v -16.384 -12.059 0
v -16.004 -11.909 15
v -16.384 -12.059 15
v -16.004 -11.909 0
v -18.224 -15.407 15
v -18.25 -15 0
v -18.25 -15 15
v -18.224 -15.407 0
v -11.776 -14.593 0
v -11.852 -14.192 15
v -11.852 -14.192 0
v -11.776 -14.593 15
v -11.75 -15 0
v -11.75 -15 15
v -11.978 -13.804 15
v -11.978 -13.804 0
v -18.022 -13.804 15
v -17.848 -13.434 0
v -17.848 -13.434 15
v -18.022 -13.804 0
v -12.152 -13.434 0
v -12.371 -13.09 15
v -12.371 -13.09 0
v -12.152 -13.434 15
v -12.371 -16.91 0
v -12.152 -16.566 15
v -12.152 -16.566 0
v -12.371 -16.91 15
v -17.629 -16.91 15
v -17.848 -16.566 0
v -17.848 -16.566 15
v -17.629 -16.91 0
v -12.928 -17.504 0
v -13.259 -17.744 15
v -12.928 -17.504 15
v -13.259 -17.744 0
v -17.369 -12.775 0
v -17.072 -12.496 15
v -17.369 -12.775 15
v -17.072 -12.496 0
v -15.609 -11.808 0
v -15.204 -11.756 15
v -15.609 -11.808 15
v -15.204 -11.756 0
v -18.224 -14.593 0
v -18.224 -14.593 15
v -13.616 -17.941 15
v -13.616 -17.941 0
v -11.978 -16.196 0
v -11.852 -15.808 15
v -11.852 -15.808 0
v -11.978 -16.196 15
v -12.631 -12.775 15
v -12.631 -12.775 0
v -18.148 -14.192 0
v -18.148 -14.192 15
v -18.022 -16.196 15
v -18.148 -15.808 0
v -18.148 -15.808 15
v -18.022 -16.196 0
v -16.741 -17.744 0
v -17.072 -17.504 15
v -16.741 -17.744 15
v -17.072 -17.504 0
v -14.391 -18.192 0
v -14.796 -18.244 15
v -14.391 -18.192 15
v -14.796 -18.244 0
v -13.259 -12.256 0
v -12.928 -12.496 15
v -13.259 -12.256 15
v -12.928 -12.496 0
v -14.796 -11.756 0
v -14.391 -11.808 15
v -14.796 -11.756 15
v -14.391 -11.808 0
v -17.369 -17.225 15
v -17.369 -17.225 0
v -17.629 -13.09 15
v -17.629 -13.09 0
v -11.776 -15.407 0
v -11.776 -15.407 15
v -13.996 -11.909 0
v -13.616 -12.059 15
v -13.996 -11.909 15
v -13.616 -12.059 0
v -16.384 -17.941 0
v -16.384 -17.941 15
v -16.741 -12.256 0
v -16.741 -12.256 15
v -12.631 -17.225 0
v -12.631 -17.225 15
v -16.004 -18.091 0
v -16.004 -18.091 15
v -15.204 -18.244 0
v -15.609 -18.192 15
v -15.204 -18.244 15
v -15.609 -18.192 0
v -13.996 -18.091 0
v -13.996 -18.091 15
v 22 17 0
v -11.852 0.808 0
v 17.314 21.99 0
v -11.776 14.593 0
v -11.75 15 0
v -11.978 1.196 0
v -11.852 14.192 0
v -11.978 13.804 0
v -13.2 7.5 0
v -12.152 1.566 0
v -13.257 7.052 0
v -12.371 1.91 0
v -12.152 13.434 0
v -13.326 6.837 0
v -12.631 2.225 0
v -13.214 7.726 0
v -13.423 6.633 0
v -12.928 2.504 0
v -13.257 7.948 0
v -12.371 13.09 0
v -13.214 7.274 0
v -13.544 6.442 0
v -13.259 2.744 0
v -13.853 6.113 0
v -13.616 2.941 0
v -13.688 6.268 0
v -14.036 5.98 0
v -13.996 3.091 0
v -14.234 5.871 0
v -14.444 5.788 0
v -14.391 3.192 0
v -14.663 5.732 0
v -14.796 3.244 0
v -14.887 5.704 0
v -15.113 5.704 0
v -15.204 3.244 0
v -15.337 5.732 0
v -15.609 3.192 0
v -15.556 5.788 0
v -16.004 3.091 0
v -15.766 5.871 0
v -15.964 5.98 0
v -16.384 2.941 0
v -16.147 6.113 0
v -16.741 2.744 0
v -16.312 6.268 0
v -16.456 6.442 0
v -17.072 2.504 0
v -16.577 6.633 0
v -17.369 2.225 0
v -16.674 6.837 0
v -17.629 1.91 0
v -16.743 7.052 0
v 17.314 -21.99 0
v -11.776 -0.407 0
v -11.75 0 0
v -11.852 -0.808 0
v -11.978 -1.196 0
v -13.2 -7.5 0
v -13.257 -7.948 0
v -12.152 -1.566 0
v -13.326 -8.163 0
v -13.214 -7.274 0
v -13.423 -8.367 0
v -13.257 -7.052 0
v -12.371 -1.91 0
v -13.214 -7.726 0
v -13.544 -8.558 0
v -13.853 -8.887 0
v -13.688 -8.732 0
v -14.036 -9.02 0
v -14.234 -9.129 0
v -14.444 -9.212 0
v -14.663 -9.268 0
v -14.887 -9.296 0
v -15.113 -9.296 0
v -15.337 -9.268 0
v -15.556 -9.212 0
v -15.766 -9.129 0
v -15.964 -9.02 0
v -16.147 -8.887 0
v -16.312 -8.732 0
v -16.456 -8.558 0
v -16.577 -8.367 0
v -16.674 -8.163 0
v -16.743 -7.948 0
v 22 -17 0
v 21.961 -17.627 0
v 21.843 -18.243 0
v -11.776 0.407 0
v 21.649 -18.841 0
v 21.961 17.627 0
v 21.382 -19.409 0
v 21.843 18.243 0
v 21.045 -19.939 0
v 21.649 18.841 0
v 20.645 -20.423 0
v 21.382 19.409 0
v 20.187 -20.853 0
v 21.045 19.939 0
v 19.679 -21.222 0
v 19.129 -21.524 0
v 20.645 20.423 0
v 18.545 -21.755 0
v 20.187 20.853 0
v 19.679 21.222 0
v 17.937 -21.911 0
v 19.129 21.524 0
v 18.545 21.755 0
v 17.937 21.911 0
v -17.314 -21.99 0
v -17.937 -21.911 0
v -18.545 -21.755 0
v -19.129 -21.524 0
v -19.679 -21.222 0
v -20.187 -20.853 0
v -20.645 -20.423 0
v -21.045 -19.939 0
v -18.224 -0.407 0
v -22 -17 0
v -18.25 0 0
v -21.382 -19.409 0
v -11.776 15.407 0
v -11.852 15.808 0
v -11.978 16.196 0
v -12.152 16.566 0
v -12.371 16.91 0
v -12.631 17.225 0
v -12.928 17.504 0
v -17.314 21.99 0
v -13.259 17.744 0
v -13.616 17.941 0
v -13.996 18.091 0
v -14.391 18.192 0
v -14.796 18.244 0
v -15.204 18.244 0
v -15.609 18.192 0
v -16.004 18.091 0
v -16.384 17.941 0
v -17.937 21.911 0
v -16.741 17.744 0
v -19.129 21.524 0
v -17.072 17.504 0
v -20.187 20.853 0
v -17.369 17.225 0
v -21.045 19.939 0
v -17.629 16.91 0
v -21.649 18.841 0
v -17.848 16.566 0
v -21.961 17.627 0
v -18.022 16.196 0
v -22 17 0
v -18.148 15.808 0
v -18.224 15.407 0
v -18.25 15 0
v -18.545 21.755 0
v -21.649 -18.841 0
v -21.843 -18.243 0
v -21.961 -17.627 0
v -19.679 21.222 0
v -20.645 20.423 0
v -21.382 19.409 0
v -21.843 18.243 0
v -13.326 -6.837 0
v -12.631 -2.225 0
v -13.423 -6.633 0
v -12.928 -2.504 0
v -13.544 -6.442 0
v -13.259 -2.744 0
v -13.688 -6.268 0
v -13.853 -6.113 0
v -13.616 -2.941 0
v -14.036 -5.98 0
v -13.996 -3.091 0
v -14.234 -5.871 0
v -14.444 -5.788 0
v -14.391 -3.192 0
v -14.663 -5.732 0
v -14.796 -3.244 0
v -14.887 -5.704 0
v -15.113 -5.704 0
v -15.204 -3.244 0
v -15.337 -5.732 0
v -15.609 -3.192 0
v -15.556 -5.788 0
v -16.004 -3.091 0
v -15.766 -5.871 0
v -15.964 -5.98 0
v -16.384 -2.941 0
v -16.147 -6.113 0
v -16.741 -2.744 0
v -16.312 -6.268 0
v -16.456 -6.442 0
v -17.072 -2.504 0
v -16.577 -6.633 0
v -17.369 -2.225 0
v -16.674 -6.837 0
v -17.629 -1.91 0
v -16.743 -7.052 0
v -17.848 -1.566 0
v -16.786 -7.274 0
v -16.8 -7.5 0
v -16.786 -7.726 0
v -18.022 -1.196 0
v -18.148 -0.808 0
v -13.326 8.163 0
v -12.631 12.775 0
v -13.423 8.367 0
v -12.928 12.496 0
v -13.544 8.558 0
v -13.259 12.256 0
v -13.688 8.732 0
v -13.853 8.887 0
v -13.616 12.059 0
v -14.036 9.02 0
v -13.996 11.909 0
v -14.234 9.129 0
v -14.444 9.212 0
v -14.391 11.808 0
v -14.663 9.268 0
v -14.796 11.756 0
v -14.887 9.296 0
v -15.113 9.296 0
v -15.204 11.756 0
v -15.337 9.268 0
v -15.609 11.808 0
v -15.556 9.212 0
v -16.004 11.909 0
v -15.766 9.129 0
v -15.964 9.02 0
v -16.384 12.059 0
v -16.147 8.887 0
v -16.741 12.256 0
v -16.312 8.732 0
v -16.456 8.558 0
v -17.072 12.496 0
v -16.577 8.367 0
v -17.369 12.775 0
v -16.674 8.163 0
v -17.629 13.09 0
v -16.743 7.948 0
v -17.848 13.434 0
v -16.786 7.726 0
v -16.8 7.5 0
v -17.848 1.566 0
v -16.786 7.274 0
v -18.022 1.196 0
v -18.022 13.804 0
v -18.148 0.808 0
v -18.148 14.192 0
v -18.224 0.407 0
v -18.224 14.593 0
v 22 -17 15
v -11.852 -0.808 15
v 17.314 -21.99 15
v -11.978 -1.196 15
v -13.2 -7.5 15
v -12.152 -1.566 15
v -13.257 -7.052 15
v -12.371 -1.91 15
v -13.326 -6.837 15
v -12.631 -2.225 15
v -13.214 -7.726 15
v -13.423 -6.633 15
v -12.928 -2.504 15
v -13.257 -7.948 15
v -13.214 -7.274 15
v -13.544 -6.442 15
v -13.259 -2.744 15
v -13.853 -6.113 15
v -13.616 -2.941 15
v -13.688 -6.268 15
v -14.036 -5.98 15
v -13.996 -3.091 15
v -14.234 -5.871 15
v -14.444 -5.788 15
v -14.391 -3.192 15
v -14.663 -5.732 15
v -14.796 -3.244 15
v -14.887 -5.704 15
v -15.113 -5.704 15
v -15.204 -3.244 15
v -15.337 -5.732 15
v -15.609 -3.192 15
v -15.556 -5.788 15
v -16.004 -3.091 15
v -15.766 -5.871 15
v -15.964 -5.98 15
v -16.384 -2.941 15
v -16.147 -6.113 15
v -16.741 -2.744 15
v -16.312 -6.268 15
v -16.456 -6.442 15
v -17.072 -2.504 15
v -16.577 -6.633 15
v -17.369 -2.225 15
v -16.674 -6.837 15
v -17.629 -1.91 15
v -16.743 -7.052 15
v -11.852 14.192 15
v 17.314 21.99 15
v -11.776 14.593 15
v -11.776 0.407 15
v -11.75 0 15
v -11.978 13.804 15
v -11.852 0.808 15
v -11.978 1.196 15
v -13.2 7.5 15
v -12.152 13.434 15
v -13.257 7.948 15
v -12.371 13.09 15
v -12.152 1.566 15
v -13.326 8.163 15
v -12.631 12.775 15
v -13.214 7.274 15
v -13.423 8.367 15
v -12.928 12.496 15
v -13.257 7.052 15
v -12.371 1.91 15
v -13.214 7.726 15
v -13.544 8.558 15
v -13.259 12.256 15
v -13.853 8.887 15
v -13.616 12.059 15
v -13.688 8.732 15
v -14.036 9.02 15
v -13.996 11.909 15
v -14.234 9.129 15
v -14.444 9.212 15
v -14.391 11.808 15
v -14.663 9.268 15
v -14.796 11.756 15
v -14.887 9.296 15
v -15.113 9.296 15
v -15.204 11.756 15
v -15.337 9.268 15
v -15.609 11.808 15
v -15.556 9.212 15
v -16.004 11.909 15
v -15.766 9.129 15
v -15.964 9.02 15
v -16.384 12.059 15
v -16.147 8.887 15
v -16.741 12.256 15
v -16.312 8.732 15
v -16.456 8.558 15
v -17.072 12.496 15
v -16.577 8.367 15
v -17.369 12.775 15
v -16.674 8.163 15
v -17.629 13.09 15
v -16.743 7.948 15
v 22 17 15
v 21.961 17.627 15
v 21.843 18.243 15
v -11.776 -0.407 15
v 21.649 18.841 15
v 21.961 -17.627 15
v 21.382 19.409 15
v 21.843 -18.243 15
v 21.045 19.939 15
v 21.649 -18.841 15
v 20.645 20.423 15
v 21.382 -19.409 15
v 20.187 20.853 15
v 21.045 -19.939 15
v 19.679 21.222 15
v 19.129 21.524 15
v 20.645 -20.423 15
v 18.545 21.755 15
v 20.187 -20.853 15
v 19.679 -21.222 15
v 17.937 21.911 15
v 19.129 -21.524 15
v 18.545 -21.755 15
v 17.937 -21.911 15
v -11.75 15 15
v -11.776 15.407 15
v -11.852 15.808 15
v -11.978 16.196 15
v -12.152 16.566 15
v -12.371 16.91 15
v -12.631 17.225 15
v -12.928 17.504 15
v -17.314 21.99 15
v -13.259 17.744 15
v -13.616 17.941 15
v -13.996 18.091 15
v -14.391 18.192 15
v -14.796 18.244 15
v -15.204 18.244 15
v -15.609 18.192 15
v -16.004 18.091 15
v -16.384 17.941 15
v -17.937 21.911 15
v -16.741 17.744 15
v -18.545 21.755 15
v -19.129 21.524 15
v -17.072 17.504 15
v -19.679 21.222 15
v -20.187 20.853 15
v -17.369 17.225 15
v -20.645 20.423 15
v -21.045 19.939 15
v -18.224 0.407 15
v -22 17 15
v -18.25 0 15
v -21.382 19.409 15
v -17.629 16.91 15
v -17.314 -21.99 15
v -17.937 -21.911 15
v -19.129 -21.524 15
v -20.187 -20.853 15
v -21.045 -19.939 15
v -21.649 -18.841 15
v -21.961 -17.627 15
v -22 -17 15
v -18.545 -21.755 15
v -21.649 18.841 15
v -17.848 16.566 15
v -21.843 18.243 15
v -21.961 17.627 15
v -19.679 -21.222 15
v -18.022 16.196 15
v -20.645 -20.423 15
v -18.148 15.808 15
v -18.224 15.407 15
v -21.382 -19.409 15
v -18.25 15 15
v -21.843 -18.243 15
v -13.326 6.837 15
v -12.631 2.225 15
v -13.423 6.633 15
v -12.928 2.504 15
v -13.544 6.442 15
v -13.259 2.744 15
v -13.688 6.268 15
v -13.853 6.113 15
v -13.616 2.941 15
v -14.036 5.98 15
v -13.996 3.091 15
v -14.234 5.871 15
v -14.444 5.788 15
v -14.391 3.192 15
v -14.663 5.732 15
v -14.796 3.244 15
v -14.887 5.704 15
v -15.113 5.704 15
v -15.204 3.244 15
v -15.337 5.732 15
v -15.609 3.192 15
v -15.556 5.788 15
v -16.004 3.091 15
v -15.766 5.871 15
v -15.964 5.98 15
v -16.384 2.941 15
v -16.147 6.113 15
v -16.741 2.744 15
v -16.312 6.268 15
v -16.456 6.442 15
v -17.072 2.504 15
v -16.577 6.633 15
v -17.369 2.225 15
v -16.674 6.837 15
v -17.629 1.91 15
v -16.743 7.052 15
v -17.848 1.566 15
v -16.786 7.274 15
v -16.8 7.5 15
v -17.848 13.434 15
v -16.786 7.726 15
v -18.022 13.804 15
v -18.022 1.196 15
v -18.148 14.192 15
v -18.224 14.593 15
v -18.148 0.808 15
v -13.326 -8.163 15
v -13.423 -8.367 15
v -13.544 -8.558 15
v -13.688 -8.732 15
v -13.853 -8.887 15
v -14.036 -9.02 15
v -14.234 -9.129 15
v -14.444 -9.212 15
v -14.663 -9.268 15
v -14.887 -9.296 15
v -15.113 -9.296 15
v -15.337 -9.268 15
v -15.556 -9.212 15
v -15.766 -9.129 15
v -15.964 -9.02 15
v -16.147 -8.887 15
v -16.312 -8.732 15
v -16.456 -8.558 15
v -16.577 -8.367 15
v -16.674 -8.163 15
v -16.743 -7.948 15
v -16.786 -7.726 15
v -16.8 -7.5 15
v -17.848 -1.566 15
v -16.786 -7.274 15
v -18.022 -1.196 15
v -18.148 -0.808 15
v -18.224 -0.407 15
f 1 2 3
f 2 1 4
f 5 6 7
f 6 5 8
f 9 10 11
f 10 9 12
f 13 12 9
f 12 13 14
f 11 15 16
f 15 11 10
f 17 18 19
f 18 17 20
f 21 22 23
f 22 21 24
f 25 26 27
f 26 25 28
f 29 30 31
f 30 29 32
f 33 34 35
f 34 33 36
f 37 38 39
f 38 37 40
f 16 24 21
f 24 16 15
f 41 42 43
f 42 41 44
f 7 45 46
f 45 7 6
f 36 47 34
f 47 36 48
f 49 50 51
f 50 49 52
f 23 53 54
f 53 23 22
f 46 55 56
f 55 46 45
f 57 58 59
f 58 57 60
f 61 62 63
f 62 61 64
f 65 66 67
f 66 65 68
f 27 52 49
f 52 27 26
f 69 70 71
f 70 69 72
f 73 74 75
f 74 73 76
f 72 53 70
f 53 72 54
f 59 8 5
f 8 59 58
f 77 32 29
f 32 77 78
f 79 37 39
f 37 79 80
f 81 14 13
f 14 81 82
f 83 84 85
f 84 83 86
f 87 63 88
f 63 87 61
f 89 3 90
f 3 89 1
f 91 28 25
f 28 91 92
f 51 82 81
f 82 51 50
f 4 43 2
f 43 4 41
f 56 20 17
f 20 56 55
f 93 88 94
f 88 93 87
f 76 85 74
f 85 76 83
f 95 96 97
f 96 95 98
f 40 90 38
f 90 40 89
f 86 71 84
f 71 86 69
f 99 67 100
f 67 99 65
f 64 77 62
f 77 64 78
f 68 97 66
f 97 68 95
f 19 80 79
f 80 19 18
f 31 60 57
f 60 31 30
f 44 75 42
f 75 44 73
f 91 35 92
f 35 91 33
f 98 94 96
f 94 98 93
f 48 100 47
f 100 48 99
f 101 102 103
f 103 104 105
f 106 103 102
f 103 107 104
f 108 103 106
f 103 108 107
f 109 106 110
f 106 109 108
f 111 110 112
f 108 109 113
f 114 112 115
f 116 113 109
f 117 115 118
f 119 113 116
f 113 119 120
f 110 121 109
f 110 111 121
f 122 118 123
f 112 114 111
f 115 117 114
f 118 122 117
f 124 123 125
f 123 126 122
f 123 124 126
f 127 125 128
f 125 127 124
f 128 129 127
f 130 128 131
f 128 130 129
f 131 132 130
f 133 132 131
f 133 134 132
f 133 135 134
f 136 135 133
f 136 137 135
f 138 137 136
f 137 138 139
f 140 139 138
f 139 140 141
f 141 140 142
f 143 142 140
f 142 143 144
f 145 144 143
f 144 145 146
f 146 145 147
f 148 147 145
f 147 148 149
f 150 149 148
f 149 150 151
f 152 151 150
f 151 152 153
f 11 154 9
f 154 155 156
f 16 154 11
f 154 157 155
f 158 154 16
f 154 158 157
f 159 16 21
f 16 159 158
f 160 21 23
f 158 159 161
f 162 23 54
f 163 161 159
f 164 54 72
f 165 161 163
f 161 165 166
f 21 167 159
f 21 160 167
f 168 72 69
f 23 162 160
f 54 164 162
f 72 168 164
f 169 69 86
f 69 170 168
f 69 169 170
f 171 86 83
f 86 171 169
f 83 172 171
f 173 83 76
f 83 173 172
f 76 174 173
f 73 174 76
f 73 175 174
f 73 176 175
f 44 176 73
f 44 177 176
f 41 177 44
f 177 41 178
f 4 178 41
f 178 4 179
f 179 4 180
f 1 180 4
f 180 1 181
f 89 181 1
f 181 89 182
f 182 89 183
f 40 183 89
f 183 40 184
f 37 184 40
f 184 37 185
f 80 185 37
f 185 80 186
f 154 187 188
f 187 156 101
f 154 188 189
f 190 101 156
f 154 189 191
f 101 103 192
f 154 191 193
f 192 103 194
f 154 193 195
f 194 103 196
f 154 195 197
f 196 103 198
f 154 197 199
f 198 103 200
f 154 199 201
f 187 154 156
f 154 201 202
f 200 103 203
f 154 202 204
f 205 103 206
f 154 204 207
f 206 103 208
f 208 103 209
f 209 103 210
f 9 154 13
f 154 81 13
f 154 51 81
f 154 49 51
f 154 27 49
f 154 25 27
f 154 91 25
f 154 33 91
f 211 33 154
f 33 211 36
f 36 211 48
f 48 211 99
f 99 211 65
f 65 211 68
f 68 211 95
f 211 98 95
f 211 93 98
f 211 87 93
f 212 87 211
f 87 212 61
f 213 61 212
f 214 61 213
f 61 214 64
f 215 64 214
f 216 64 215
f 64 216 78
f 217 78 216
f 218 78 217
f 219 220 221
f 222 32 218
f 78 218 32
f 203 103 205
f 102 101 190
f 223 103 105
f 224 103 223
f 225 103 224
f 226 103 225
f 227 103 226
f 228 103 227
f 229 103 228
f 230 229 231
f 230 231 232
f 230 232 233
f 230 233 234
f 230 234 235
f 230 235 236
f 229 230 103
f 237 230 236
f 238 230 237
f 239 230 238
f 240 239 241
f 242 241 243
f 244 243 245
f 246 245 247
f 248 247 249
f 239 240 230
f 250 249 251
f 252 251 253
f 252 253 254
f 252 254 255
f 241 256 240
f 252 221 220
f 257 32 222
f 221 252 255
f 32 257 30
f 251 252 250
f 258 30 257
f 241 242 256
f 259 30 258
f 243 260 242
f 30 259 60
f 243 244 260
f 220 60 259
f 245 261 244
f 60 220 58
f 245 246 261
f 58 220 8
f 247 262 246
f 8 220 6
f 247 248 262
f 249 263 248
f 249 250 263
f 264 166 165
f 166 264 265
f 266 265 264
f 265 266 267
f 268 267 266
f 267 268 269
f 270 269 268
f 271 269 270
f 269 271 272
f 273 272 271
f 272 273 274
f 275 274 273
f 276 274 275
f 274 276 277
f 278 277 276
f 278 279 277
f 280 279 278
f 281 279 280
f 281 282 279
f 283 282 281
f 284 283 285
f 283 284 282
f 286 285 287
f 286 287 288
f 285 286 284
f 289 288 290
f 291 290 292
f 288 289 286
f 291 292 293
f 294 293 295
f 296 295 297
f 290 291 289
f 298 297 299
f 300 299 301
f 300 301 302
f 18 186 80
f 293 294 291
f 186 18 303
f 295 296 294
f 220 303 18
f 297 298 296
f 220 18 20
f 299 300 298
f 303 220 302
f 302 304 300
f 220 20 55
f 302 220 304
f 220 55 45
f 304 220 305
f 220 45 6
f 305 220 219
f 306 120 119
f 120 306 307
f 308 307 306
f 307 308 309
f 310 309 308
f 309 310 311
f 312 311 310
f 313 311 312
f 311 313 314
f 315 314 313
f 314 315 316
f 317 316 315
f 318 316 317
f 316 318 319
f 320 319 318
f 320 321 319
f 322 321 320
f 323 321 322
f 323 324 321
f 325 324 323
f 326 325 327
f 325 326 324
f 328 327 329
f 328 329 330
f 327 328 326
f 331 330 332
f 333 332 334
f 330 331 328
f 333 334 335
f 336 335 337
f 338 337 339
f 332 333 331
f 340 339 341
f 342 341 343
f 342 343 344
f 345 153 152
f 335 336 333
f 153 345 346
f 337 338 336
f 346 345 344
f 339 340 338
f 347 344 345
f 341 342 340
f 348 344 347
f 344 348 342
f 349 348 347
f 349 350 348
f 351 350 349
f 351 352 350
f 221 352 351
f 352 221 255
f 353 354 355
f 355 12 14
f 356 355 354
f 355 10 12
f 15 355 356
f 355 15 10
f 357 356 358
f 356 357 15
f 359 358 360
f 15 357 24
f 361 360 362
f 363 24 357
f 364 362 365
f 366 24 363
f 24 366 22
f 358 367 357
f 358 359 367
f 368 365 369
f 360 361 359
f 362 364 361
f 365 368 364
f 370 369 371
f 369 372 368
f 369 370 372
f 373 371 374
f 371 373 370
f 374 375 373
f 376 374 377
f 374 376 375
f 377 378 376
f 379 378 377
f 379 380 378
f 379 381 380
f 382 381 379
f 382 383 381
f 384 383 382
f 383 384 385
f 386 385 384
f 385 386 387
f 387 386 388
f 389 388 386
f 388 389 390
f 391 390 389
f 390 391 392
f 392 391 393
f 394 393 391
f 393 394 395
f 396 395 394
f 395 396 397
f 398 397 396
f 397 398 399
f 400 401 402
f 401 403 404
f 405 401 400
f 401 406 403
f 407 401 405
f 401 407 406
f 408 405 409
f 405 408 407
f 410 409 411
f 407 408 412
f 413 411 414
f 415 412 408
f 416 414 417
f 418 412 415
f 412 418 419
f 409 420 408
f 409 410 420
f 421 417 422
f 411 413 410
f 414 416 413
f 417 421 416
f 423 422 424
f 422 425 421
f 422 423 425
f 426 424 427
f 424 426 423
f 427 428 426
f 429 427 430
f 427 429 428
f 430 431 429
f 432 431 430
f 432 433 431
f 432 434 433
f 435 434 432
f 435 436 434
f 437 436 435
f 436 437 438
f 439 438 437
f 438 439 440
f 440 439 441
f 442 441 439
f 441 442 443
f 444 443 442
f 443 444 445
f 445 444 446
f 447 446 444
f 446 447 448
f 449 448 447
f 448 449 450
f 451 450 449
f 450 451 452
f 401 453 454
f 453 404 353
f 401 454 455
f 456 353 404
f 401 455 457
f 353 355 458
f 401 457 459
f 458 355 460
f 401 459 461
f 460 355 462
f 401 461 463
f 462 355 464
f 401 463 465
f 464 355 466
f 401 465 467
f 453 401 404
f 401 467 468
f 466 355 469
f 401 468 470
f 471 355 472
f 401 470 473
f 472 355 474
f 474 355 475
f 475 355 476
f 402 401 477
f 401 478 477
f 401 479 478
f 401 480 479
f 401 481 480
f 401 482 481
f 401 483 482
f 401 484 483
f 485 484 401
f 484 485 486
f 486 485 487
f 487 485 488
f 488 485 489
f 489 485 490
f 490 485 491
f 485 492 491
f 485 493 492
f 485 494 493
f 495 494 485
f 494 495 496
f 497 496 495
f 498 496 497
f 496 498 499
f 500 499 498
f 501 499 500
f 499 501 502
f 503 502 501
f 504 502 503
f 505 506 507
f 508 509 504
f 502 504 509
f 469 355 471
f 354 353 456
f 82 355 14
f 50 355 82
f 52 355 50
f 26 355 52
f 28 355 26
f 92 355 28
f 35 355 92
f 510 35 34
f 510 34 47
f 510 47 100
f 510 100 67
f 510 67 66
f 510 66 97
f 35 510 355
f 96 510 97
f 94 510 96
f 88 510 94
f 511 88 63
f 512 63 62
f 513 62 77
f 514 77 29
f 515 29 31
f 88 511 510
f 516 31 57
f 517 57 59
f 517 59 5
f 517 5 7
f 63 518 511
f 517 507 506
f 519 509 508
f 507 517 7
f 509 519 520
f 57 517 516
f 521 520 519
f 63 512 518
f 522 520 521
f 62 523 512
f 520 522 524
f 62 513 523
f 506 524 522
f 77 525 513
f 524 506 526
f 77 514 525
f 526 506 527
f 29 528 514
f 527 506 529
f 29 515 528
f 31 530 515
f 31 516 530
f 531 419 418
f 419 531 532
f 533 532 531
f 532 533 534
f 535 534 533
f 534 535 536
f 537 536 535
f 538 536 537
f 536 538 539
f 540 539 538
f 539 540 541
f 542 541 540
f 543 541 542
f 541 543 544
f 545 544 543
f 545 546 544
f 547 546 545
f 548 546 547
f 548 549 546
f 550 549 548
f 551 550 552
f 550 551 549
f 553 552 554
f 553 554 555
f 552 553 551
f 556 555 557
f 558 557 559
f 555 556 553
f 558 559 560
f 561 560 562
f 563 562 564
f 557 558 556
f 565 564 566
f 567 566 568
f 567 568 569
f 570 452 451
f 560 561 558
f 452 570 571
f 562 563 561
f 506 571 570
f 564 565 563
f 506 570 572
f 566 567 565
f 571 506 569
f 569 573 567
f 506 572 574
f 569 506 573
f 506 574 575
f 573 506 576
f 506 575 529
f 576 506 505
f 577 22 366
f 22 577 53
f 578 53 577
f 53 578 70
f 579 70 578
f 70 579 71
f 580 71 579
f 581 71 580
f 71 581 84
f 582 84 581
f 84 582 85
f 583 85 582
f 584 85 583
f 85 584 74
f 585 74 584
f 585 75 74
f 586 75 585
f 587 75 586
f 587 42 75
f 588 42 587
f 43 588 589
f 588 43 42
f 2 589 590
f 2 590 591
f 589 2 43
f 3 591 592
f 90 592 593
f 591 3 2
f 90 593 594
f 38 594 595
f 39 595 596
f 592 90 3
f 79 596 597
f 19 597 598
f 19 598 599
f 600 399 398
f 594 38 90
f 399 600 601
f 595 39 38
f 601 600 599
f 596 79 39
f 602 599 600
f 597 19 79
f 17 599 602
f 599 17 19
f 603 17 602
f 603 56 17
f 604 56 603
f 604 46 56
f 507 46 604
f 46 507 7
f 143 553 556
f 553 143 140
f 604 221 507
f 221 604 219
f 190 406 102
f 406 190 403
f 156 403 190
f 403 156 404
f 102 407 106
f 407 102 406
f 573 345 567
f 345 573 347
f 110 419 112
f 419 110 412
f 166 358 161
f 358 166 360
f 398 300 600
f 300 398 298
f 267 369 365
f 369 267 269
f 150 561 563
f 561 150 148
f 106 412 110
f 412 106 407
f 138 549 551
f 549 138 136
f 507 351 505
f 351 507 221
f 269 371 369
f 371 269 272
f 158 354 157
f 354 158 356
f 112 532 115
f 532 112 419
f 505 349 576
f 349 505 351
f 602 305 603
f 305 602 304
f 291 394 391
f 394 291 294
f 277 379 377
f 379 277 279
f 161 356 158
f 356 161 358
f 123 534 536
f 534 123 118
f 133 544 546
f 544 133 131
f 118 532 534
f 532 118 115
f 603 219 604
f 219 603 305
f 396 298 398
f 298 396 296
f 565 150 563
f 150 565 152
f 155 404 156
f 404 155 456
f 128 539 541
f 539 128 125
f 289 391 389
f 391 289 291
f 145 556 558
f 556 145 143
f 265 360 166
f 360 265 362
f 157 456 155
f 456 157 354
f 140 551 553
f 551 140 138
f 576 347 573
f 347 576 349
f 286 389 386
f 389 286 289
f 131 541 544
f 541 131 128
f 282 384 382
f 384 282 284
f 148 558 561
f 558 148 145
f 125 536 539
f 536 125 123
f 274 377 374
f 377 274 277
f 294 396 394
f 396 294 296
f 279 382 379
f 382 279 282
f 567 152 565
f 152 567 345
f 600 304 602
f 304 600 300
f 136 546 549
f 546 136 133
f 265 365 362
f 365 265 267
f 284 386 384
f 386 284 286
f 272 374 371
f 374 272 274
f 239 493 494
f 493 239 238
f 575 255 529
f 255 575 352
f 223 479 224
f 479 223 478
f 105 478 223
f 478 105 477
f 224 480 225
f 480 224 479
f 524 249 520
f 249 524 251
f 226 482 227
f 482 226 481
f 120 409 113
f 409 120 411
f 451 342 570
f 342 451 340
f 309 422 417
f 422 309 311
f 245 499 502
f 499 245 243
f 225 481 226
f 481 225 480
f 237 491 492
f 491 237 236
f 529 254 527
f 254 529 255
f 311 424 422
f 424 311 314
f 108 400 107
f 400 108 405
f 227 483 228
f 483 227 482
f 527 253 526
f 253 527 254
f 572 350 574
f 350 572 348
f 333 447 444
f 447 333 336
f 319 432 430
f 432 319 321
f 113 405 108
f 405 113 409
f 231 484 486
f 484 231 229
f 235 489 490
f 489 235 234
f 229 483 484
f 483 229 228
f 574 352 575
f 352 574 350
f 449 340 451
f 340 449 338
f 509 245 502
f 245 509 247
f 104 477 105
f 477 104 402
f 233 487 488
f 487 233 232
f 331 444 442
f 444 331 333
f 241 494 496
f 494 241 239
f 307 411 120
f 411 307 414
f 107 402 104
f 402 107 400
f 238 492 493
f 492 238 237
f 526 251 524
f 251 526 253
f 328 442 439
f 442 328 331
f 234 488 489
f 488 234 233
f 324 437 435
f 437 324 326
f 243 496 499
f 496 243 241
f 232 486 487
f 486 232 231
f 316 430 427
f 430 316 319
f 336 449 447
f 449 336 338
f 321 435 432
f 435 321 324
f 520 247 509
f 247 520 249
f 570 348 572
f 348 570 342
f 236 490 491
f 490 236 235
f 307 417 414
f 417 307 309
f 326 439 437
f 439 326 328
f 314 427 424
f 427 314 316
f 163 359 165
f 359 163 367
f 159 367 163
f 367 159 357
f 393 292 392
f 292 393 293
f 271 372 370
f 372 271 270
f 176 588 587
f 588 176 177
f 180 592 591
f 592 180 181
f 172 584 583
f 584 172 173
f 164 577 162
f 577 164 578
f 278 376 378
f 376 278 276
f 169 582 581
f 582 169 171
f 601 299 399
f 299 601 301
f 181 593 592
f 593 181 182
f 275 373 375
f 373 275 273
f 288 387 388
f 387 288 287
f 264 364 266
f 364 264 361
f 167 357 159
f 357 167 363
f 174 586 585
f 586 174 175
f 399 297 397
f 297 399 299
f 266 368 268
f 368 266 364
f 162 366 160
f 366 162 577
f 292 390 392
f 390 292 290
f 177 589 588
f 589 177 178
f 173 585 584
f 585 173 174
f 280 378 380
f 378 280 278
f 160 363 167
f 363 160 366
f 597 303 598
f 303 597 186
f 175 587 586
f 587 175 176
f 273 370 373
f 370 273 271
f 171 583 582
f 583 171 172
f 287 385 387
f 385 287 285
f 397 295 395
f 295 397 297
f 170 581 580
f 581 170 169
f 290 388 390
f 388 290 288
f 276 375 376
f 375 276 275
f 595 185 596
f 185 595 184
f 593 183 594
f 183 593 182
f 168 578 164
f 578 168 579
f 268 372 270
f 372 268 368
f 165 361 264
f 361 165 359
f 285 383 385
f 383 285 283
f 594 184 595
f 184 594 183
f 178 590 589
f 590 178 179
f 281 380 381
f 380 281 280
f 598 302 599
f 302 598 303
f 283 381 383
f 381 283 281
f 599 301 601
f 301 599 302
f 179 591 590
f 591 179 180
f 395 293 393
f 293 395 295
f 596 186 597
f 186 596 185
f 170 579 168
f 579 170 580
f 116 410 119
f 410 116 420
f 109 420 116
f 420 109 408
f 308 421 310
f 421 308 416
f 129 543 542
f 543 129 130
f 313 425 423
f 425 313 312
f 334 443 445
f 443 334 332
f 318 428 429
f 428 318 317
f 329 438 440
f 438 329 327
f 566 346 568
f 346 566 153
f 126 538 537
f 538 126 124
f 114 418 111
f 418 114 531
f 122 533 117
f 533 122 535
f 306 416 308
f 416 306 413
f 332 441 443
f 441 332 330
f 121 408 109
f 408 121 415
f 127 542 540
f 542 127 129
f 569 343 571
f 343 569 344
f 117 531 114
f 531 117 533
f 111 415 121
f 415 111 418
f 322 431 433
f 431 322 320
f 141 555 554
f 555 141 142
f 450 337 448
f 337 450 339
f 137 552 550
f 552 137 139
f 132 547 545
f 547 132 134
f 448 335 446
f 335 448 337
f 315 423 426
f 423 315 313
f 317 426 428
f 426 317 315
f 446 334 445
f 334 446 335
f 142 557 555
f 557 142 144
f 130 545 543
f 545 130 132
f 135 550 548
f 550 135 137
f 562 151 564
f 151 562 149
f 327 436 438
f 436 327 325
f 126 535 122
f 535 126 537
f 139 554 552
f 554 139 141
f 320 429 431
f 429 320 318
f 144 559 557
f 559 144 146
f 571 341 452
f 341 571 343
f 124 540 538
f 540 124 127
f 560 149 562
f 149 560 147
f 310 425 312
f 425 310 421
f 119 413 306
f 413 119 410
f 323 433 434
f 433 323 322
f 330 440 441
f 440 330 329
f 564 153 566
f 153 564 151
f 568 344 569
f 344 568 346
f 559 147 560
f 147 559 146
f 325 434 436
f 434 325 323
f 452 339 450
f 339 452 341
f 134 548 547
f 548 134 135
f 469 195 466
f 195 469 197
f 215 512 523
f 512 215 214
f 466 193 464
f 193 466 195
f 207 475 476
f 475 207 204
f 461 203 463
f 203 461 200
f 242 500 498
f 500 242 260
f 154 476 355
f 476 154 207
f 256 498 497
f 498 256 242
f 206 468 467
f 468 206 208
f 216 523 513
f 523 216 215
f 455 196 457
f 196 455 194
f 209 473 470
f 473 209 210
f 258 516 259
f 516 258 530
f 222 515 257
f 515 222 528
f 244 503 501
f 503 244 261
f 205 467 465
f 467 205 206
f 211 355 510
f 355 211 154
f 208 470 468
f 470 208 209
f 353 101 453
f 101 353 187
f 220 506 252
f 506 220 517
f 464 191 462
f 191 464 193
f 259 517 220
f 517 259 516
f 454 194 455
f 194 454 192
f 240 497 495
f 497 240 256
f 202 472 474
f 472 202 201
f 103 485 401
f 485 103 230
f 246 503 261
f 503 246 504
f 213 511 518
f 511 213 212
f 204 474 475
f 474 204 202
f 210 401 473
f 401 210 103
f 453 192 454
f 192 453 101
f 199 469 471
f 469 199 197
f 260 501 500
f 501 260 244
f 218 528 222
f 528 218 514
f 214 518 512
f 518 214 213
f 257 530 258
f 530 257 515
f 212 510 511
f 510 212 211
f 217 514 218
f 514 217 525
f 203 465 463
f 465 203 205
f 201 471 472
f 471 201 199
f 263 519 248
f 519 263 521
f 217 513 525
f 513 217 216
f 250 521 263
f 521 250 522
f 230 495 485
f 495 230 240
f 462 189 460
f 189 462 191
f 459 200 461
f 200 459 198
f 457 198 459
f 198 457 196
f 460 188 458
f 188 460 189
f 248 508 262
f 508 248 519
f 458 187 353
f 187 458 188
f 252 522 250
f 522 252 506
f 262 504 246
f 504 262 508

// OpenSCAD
$fn = 50;


difference() {
	union() {
		hull() {
			translate(v = [-17.0000000000, 17.0000000000, 0]) {
				cylinder(h = 15, r = 5);
			}
			translate(v = [17.0000000000, 17.0000000000, 0]) {
				cylinder(h = 15, r = 5);
			}
			translate(v = [-17.0000000000, -17.0000000000, 0]) {
				cylinder(h = 15, r = 5);
			}
			translate(v = [17.0000000000, -17.0000000000, 0]) {
				cylinder(h = 15, r = 5);
			}
		}
	}
	union() {
		translate(v = [-15.0000000000, -15.0000000000, 0]) {
			cylinder(h = 15, r = 3.2500000000);
		}
		translate(v = [-15.0000000000, 0.0000000000, 0]) {
			cylinder(h = 15, r = 3.2500000000);
		}
		translate(v = [-15.0000000000, 15.0000000000, 0]) {
			cylinder(h = 15, r = 3.2500000000);
		}
		translate(v = [-15.0000000000, -15.0000000000, 0]) {
			cylinder(h = 15, r = 1.8000000000);
		}
		translate(v = [-15.0000000000, -7.5000000000, 0]) {
			cylinder(h = 15, r = 1.8000000000);
		}
		translate(v = [-15.0000000000, 0.0000000000, 0]) {
			cylinder(h = 15, r = 1.8000000000);
		}
		translate(v = [-15.0000000000, 7.5000000000, 0]) {
			cylinder(h = 15, r = 1.8000000000);
		}
		translate(v = [-15.0000000000, 15.0000000000, 0]) {
			cylinder(h = 15, r = 1.8000000000);
		}
		translate(v = [-15.0000000000, -15.0000000000, 0]) {
			cylinder(h = 15, r = 1.8000000000);
		}
		translate(v = [-15.0000000000, -7.5000000000, 0]) {
			cylinder(h = 15, r = 1.8000000000);
		}
		translate(v = [-15.0000000000, 0.0000000000, 0]) {
			cylinder(h = 15, r = 1.8000000000);
		}
		translate(v = [-15.0000000000, 7.5000000000, 0]) {
			cylinder(h = 15, r = 1.8000000000);
		}
		translate(v = [-15.0000000000, 15.0000000000, 0]) {
			cylinder(h = 15, r = 1.8000000000);
		}
		translate(v = [-15.0000000000, -15.0000000000, 0]) {
			cylinder(h = 15, r = 1.8000000000);
		}
		translate(v = [-15.0000000000, -7.5000000000, 0]) {
			cylinder(h = 15, r = 1.8000000000);
		}
		translate(v = [-15.0000000000, 0.0000000000, 0]) {
			cylinder(h = 15, r = 1.8000000000);
		}
		translate(v = [-15.0000000000, 7.5000000000, 0]) {
			cylinder(h = 15, r = 1.8000000000);
		}
		translate(v = [-15.0000000000, 15.0000000000, 0]) {
			cylinder(h = 15, r = 1.8000000000);
		}
	}
}
